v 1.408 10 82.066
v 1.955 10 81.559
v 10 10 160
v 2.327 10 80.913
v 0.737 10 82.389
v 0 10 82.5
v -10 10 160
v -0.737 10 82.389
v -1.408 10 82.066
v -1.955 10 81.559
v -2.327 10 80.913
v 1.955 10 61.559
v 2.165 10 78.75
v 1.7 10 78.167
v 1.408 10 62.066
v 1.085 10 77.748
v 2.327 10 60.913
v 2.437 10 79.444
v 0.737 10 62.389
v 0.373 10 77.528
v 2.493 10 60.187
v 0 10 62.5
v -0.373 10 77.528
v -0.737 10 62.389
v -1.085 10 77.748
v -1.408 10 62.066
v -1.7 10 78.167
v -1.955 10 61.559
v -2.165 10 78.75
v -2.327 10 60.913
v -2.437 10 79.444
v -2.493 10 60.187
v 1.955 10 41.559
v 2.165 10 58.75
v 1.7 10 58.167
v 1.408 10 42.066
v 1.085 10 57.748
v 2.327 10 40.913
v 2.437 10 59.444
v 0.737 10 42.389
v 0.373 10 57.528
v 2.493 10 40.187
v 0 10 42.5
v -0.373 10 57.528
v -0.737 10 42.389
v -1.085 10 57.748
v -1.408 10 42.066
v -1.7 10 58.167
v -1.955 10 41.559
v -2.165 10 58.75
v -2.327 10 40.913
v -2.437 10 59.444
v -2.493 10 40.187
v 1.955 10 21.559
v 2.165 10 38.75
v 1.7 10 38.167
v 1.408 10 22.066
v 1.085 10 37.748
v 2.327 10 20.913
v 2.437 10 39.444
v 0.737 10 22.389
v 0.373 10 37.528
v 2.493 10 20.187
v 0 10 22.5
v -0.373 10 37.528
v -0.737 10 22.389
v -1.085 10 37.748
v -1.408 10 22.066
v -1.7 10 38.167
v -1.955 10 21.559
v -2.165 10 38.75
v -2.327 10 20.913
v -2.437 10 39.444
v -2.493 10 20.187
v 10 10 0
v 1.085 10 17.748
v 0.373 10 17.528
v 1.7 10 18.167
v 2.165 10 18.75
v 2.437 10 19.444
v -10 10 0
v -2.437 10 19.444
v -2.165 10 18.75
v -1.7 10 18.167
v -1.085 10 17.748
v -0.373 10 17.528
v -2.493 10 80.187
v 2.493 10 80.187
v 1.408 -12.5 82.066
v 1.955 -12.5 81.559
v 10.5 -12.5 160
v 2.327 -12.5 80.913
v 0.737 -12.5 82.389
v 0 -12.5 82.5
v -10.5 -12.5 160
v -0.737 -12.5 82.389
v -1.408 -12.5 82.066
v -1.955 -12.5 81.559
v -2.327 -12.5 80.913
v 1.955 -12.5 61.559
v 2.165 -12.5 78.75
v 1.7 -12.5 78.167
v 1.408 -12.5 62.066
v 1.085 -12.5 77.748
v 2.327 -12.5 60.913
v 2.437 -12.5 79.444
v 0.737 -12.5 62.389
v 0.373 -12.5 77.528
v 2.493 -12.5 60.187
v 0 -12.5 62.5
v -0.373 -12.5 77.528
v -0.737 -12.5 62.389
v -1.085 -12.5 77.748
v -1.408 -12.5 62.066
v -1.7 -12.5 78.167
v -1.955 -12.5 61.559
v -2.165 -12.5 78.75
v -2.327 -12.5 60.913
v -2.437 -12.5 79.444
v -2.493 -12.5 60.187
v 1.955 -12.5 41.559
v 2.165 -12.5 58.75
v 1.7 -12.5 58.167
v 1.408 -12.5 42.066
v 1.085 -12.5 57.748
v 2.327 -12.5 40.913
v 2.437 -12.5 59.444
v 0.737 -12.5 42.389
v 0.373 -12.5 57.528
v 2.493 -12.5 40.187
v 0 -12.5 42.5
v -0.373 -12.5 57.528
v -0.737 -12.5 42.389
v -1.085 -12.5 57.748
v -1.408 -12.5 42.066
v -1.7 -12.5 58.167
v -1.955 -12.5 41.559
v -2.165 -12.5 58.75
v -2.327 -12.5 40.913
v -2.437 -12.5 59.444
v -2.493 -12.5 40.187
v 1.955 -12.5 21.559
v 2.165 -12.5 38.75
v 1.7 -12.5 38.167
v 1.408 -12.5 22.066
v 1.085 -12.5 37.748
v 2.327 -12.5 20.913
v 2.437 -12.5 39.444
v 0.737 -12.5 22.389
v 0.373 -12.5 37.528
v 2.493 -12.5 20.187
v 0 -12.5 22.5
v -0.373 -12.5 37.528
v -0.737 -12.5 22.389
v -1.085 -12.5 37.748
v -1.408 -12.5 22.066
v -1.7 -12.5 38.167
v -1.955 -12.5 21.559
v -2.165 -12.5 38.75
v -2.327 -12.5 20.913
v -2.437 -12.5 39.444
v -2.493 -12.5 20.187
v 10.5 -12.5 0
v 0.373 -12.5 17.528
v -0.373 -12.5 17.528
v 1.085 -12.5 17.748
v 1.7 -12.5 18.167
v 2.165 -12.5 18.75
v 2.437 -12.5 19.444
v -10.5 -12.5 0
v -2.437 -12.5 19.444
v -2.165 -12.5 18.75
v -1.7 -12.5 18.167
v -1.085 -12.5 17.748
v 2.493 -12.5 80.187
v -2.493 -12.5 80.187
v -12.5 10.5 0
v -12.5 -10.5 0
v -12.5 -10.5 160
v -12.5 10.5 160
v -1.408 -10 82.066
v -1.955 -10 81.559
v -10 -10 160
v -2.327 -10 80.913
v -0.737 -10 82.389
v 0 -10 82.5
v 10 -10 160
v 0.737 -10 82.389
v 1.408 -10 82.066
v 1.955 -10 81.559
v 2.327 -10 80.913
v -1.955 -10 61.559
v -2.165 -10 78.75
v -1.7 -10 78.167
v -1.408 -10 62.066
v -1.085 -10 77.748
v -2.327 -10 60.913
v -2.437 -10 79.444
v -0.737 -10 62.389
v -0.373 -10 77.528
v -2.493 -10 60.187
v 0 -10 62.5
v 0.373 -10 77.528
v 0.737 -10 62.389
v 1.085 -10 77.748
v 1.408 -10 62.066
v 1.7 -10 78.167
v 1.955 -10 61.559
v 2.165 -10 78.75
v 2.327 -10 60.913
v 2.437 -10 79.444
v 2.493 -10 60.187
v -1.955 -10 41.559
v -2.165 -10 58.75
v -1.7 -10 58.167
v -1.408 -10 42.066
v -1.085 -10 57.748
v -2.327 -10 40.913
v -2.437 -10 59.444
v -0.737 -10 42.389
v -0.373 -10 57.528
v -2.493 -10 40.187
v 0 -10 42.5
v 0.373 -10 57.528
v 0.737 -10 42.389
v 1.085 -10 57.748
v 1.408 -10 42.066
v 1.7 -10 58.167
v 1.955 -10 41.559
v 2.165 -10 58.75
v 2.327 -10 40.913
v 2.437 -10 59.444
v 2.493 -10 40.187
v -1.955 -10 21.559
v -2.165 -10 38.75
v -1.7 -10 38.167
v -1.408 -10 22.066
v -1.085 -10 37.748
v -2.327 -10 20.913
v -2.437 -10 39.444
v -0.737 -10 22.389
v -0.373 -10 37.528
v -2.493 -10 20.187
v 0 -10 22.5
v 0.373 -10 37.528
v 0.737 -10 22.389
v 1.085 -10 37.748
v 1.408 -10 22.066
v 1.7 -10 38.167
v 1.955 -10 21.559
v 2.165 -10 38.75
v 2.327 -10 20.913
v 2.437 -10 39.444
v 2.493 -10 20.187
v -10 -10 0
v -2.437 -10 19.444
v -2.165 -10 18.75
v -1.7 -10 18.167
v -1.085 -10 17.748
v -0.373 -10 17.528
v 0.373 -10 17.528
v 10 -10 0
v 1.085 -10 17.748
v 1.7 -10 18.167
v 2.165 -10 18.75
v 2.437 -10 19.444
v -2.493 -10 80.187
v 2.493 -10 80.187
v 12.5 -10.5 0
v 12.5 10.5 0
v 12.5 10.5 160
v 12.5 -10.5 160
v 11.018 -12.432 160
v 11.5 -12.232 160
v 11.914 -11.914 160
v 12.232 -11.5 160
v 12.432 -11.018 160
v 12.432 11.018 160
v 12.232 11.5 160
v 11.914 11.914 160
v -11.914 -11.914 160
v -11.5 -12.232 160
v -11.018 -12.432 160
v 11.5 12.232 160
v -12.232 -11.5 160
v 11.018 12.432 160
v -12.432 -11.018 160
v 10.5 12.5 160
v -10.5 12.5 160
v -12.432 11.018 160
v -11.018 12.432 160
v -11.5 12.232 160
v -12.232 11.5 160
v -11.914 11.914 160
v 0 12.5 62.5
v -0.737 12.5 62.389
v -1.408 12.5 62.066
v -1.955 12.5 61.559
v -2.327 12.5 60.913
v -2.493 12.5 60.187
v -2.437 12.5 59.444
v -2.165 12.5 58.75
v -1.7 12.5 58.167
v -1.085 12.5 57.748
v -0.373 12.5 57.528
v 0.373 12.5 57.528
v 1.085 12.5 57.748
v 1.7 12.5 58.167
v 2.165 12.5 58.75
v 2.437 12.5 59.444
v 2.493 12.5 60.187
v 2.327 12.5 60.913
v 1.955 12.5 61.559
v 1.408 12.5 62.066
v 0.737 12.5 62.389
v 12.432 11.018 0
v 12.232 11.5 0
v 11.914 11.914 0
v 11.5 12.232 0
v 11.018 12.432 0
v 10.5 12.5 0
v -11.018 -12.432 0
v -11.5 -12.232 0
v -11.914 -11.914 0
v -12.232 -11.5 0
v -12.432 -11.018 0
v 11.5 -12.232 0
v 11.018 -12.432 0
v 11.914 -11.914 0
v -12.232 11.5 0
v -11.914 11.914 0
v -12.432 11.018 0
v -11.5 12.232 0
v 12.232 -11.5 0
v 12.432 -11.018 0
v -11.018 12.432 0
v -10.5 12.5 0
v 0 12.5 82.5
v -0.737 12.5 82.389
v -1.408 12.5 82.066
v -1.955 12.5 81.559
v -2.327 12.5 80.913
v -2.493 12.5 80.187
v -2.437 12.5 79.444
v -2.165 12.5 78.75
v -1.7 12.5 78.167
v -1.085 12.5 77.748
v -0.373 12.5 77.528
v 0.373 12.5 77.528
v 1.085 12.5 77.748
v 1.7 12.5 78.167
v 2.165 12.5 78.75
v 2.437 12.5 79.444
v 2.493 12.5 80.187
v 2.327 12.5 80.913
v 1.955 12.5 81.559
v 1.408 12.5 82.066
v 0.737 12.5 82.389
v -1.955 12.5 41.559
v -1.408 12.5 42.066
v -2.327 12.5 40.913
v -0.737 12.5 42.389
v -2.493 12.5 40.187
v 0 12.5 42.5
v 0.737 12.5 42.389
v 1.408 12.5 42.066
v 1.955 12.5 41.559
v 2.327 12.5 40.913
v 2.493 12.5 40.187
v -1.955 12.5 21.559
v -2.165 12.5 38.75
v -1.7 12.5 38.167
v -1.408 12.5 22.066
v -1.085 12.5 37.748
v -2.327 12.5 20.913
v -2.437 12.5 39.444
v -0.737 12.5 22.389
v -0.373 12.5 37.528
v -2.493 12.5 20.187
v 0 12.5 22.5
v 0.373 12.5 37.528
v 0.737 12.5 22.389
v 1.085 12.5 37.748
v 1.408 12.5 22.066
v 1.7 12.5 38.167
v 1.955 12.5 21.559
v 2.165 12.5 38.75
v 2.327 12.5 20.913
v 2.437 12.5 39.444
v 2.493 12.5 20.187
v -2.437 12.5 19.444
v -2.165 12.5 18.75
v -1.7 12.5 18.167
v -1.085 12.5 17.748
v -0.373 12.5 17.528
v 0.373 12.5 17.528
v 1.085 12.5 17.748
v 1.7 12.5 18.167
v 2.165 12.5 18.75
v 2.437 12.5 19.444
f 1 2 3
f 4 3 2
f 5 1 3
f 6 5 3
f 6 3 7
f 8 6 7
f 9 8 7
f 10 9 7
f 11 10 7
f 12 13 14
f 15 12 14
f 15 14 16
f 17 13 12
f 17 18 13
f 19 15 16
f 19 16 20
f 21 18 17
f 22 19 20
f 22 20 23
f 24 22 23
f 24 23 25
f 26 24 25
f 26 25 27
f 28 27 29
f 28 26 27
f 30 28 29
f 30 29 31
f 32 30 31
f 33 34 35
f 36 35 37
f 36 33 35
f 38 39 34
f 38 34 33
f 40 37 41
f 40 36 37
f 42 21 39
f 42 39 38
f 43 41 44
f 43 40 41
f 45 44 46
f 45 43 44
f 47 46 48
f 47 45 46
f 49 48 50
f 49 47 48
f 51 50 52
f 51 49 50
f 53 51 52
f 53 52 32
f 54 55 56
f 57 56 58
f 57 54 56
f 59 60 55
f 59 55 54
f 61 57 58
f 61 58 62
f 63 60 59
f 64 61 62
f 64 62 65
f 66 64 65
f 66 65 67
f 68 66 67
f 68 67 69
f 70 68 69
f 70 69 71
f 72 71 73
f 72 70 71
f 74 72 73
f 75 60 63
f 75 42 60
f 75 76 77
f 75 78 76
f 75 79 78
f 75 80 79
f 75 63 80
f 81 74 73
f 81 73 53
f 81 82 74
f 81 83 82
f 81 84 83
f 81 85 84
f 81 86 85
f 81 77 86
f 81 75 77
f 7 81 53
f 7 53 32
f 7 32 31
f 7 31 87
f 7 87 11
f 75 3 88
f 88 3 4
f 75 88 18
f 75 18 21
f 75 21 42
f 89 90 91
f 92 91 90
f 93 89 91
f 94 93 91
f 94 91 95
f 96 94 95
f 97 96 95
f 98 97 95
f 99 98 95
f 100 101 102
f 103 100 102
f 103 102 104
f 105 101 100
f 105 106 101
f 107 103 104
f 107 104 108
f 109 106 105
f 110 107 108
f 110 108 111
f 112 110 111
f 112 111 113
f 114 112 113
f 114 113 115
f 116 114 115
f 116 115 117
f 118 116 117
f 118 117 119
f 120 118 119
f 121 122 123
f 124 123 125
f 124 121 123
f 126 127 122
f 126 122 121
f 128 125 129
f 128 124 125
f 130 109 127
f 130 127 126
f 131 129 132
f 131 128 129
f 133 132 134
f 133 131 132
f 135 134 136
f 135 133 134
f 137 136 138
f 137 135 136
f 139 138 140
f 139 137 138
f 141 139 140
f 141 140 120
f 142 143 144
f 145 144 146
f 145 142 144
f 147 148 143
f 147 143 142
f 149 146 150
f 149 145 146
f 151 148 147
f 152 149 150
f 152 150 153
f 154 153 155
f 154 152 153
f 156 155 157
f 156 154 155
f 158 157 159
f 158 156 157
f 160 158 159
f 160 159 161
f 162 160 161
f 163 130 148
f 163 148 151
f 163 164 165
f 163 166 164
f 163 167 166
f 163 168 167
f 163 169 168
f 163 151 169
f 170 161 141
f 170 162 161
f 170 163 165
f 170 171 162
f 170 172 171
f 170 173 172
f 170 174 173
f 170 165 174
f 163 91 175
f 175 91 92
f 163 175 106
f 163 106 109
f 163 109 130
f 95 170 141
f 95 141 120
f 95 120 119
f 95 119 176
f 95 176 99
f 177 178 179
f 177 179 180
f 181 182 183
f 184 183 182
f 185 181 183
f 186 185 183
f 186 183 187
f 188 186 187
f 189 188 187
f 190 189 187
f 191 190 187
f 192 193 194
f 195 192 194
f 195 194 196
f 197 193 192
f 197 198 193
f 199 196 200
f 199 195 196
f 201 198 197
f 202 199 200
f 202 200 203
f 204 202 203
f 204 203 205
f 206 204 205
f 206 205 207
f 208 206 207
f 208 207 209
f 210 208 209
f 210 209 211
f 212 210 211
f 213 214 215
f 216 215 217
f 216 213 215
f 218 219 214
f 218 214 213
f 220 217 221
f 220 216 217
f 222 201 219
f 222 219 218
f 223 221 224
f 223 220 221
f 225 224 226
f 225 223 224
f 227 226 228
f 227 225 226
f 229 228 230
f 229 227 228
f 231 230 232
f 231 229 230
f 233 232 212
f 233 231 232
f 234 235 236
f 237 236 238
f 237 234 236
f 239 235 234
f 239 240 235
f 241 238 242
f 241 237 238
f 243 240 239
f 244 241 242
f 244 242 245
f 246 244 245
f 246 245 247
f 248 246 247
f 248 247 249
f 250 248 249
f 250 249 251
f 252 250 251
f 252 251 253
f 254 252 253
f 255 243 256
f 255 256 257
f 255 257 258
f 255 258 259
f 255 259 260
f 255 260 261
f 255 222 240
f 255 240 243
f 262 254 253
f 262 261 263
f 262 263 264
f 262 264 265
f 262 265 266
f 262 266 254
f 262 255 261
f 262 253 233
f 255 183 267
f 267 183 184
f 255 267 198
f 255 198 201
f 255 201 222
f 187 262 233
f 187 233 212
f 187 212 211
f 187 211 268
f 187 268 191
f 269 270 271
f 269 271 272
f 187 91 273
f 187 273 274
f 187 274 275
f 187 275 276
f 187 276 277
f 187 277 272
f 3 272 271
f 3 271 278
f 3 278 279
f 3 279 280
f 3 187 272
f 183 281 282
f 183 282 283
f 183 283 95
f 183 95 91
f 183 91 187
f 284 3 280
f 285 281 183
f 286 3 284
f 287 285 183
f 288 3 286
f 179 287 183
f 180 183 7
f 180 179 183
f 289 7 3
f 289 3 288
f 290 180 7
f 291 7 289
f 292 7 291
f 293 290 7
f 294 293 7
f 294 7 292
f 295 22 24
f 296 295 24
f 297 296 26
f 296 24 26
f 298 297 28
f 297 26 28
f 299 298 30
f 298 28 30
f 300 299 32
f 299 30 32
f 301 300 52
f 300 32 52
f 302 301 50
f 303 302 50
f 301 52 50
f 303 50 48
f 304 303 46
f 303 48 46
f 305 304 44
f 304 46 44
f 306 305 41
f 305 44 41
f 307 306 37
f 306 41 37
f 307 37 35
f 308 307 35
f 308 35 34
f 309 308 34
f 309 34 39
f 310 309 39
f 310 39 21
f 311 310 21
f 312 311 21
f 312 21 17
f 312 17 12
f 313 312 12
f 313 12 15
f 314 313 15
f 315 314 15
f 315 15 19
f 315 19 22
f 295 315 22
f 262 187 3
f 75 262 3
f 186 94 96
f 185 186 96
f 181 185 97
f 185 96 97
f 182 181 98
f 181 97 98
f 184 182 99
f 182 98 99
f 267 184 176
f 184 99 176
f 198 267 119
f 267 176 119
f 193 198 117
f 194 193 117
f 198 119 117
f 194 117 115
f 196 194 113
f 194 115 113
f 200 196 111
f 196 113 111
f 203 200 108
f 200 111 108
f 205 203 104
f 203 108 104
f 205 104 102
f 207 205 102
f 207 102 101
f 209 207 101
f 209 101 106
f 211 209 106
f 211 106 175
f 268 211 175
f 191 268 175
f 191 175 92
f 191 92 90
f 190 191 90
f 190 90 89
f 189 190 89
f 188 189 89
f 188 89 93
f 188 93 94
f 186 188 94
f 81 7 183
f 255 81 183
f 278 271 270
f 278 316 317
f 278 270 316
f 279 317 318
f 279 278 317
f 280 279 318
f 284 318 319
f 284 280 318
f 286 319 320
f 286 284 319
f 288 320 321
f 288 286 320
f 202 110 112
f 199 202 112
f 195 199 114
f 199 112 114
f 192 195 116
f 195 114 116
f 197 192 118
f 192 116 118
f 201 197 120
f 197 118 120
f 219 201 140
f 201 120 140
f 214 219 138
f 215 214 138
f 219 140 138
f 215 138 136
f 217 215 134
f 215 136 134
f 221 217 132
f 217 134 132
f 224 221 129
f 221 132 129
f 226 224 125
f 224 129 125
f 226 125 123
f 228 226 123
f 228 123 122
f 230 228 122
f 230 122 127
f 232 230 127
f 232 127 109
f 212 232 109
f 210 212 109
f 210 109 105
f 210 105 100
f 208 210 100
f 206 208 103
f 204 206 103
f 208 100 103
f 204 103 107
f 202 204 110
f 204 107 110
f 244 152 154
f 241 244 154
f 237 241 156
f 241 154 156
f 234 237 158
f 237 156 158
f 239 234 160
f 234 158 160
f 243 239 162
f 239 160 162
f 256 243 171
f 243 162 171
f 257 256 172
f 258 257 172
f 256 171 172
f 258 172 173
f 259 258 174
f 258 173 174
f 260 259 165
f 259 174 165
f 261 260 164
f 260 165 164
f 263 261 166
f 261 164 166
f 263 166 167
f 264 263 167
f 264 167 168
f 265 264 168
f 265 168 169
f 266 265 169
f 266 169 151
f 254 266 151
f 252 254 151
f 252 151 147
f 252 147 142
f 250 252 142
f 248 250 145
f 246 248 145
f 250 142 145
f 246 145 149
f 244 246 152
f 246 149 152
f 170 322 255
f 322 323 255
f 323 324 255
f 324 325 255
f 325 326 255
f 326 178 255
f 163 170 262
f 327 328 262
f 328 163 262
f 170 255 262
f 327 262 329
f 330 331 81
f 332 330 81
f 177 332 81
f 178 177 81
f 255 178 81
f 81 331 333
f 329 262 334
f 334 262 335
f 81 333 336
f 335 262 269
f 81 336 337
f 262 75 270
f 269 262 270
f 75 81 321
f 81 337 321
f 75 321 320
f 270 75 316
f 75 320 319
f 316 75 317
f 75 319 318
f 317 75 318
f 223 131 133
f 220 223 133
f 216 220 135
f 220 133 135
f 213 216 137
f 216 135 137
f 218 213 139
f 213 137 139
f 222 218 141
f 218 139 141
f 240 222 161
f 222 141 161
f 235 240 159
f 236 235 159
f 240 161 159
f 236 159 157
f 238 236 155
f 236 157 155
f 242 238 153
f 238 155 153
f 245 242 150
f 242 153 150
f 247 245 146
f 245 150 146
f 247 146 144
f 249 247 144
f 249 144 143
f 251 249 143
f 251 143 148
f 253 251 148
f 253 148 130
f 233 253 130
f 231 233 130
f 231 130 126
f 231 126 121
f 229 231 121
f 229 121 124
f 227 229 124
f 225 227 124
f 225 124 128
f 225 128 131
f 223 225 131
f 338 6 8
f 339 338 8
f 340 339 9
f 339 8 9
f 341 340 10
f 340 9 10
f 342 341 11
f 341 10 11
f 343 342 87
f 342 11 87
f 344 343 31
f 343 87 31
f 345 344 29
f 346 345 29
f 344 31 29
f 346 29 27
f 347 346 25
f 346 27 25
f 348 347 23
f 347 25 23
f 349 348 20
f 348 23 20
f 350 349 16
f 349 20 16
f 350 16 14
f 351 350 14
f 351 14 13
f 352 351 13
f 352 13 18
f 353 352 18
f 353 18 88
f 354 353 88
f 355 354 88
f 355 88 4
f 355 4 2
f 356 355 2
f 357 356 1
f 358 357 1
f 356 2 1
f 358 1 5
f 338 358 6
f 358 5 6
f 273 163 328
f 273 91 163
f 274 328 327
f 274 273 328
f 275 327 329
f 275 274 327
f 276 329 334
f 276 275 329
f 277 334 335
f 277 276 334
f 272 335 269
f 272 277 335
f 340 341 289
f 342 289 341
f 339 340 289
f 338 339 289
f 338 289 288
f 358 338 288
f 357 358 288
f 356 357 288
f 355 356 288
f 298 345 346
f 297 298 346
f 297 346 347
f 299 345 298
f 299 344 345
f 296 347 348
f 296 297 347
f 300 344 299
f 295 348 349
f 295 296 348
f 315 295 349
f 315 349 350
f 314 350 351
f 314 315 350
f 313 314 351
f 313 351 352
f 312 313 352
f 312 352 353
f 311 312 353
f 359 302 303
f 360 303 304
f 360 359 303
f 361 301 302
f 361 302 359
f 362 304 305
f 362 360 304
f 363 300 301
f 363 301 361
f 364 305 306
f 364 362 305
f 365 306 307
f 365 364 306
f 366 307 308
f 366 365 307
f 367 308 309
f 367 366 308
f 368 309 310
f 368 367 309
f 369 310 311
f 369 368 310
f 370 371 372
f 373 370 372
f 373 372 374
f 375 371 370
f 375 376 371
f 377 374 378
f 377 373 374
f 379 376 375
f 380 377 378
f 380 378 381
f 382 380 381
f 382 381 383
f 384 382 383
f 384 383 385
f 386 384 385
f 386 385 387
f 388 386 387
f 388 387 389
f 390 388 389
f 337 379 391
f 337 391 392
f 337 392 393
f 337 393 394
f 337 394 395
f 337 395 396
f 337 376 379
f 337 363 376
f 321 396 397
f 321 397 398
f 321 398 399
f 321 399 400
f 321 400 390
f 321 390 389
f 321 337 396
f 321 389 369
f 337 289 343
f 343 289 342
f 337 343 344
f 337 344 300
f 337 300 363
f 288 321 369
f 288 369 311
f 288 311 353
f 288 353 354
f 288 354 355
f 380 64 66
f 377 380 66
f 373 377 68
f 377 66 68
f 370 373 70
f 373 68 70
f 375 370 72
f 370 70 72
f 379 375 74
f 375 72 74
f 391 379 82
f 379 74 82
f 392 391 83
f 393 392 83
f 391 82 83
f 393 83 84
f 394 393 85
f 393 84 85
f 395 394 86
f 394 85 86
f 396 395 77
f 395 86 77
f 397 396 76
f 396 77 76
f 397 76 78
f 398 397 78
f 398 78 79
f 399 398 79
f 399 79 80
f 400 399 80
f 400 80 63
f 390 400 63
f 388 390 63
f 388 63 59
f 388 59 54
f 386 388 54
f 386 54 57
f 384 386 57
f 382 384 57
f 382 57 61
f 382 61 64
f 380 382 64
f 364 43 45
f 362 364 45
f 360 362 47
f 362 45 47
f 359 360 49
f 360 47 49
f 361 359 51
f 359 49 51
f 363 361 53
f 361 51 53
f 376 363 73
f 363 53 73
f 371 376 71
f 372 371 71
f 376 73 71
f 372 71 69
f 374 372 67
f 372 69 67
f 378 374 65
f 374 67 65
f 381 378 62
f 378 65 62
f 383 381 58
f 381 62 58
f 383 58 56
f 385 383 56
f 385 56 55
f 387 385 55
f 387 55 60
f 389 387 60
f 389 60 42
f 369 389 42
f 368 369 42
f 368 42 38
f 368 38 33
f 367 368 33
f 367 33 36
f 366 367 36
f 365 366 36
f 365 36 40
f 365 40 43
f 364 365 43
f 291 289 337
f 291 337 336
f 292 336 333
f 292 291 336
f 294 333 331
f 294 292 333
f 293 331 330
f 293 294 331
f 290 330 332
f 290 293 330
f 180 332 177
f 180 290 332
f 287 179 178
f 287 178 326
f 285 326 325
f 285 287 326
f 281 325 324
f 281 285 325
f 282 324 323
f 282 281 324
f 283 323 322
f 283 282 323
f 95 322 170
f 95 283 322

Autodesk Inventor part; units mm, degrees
ref_plane "YZ Plane" through (0, 0, 0) normal (1, 0, 0) x (0, 1, 0)
sketch "Sketch1" plane through (0, 0, 0) normal (0, 0, 1) x (1, 0, 0)
  line L0 (-12.5, 12.5) -> (12.5, 12.5)
  line L1 (12.5, 12.5) -> (12.5, -12.5)
  line L2 (12.5, -12.5) -> (-12.5, -12.5)
  line L3 (-12.5, -12.5) -> (-12.5, 12.5)
  line L4 (10, 10) -> (-10, 10)
  line L5 (-10, 10) -> (-10, -10)
  line L6 (-10, -10) -> (10, -10)
  line L7 (10, -10) -> (10, 10)
  point P0 (0, 0)
  dimension "d0" = 25
  dimension "d1" = 25
  dimension "d2" = 12.5
  dimension "d3" = 12.5
  dimension "d4" = 2.5
extrude "Extrusion1" add sketch "Sketch1" along normal blind 1000
fillet "Fillet1" radius 2 4 edges at (12.5, 12.5, 500) (-12.5, 12.5, 500) (-12.5, -12.5, 500) (12.5, -12.5, 500)
ref_plane "Work Plane1" through (0, 0, 160) normal (0, 0, -1) x (-1, 0, 0)
split "Split1" plane through (0, 0, 160) removes the side toward (0, 0, 1)
sketch "Sketch2" plane through (-10.5, 12.5, 0) normal (0, 1, 0) x (1, 0, 0)
  point P0 (10.5, 0)
  point P1 (10.5, -20)
  dimension "d9" = 0
  dimension "d10" = 20
hole "Hole1" at (0, 12.5, 20) direction (0, -1, 0) diameter 5 end through all
pattern_linear "Rectangular Pattern1" count 4 spacing 20 along (0, 0, 1) of "Hole1"
ref_plane "Work Plane3" through (-10.5, -12.5, 135.5) normal (0, 0, 1) x (1, 0, 0)
split "Split3" [suppressed]
equation "\"d0\" = -2 * a + sm_varx_squareBarDimension - tol"
equation "\"d1\" = d0"
equation "\"d2\" = 0.5 * d1"
equation "\"d3\" = 0.5 * d0"
equation "\"d4\" = a"
equation "\"d10\" = 0.666667 * sm_varx_squareBarDimension"
equation "\"d11\" = sm_varx_pinPlate_holeDiameter"
equation "\"d20\" = 0.666667 * sm_varx_squareBarDimension"
equation "\"sm_varx_squareBarThickness\" = 2.5"
equation "\"sm_varx_pinPlate_holeDiameter\" = 5"
equation "\"a\" = sm_varx_squareBarThickness"
equation "\"sm_varx_member_tolerance\" = 0"
equation "\"hoop_angle_z\" = 45deg"
equation "\"hoop_bearing_length\" = 5deg"
equation "\"hoop_bushing12_od\" = -2 * hoop_thickness_large + hoop_width_large + hoop_bushing12_radialInterference"
equation "\"hoop_bushing12_radialInterference\" = 0"
equation "\"hoop_bushing12_thickness\" = -hoop_width_medium + hoop_bushing12_od - 2 * hoop_bushing12_radialInterference"
equation "\"hoop_bushing23_od\" = -2 * hoop_thickness_medium + hoop_width_medium + hoop_bushing23_radialInterference"
equation "\"hoop_bushing23_radialInterference\" = 0"
equation "\"hoop_bushing23_thickness\" = -hoop_width_small + hoop_bushing23_od - 2 * hoop_bushing23_radialInterference"
equation "\"hoop_cable_diam\" = 5"
equation "\"hoop_cable_pulley_diam\" = 22"
equation "\"hoop_tabs_hole\" = 12"
equation "\"hoop_tabs_thickness\" = 6"
equation "\"hoop_thickness_large\" = 4"
equation "\"hoop_thickness_medium\" = 3.2"
equation "\"hoop_thickness_small\" = 2"
equation "\"hoop_width_large\" = 51"
equation "\"hoop_width_medium\" = 33.7"
equation "\"hoop_width_small\" = 25.4"
equation "\"rack_tooth_addendum\" = 5"
equation "\"rack_tooth_dedendum\" = 5"
equation "\"rack_tooth_thickness\" = 5"
equation "\"secure_arm_angle\" = 35deg"
equation "\"secure_arm_radii\" = 9"
equation "\"sm_varx_pinPlate_thickness\" = 5"
equation "\"support_baseClamp_platformLengthBuffer\" = 35"
equation "\"support_baseClamp_platformThickness\" = 15"
equation "\"support_baseClamp_platformWidthBuffer\" = 0"
equation "\"support_baseClamp_sleeveHoleDiameter\" = 12"
equation "\"support_baseClamp_sleeveSweepTerminationAngle\" = 55deg"
equation "\"support_baseClamp_thickness\" = 8"
equation "\"support_frame_endHoleBuffer\" = 45"
equation "\"support_frame_squareBarFillet\" = 2"
equation "\"support_frame_squareBarThickness\" = 5"
equation "\"wheelchair_deployed_height\" = 914"
equation "\"wheelchair_deployed_length\" = 1067"
equation "\"wheelchair_deployed_width\" = 635"
equation "\"wheelchatir_pos_deploy_angle_0\" = 65deg"
equation "\"wheelchatir_pos_store_angle_0\" = 90deg"
equation "\"wheelchatir_pos_deploy_angle_1\" = 20deg"
equation "\"wheelchatir_pos_store_angle_1\" = 20deg"
equation "\"sm_varx_squareBarDimension\" = 30"
equation "\"tol\" = 0"
properties part number "member_vertical_inner" material "Steel, Galvanized"
